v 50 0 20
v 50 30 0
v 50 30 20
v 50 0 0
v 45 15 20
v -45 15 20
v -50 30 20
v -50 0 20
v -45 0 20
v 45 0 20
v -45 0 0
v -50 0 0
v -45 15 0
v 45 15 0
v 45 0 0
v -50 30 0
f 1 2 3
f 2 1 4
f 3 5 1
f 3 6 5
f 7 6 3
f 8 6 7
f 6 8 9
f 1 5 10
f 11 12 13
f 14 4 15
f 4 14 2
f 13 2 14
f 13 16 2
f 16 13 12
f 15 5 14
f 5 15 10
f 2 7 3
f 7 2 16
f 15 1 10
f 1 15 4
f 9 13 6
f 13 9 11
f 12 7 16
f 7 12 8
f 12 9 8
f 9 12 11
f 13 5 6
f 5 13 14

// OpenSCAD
// file: constants.scad
/* sinusoid-plotter: A parametric sinusoid plotter made with OpenSCAD.
 * Copyright (C) 2013  Clayton G. Hobbs
 * 
 * This program is free software: you can redistribute it and/or modify
 * it under the terms of the GNU General Public License as published by
 * the Free Software Foundation, either version 3 of the License, or
 * (at your option) any later version.
 * 
 * This program is distributed in the hope that it will be useful,
 * but WITHOUT ANY WARRANTY; without even the implied warranty of
 * MERCHANTABILITY or FITNESS FOR A PARTICULAR PURPOSE.  See the
 * GNU General Public License for more details.
 * 
 * You should have received a copy of the GNU General Public License
 * along with this program.  If not, see <http://www.gnu.org/licenses/>.
 */

pi = 3.1415926535897932384626433832795;
// main file
/* sinusoid-plotter: A parametric sinusoid plotter made with OpenSCAD.
 * Copyright (C) 2013  Clayton G. Hobbs
 * 
 * This program is free software: you can redistribute it and/or modify
 * it under the terms of the GNU General Public License as published by
 * the Free Software Foundation, either version 3 of the License, or
 * (at your option) any later version.
 * 
 * This program is distributed in the hope that it will be useful,
 * but WITHOUT ANY WARRANTY; without even the implied warranty of
 * MERCHANTABILITY or FITNESS FOR A PARTICULAR PURPOSE.  See the
 * GNU General Public License for more details.
 * 
 * You should have received a copy of the GNU General Public License
 * along with this program.  If not, see <http://www.gnu.org/licenses/>.
 */

include <constants.scad>;

module handle(handle_size, side_size, hole_pos, hole_radius)
{
	translate([handle_size[0]/2, 0, 0])
	cube(side_size);

	translate([-handle_size[0]/2 - side_size[0], 0, 0])
	cube(side_size);

	translate([-handle_size[0]/2, side_size[1] - handle_size[1], 0])
	cube(handle_size);
}

handle(handle_size = [90, 15, 20], side_size = [5, 30, 20], hole_pos = 6,
       hole_radius = 3.13);
